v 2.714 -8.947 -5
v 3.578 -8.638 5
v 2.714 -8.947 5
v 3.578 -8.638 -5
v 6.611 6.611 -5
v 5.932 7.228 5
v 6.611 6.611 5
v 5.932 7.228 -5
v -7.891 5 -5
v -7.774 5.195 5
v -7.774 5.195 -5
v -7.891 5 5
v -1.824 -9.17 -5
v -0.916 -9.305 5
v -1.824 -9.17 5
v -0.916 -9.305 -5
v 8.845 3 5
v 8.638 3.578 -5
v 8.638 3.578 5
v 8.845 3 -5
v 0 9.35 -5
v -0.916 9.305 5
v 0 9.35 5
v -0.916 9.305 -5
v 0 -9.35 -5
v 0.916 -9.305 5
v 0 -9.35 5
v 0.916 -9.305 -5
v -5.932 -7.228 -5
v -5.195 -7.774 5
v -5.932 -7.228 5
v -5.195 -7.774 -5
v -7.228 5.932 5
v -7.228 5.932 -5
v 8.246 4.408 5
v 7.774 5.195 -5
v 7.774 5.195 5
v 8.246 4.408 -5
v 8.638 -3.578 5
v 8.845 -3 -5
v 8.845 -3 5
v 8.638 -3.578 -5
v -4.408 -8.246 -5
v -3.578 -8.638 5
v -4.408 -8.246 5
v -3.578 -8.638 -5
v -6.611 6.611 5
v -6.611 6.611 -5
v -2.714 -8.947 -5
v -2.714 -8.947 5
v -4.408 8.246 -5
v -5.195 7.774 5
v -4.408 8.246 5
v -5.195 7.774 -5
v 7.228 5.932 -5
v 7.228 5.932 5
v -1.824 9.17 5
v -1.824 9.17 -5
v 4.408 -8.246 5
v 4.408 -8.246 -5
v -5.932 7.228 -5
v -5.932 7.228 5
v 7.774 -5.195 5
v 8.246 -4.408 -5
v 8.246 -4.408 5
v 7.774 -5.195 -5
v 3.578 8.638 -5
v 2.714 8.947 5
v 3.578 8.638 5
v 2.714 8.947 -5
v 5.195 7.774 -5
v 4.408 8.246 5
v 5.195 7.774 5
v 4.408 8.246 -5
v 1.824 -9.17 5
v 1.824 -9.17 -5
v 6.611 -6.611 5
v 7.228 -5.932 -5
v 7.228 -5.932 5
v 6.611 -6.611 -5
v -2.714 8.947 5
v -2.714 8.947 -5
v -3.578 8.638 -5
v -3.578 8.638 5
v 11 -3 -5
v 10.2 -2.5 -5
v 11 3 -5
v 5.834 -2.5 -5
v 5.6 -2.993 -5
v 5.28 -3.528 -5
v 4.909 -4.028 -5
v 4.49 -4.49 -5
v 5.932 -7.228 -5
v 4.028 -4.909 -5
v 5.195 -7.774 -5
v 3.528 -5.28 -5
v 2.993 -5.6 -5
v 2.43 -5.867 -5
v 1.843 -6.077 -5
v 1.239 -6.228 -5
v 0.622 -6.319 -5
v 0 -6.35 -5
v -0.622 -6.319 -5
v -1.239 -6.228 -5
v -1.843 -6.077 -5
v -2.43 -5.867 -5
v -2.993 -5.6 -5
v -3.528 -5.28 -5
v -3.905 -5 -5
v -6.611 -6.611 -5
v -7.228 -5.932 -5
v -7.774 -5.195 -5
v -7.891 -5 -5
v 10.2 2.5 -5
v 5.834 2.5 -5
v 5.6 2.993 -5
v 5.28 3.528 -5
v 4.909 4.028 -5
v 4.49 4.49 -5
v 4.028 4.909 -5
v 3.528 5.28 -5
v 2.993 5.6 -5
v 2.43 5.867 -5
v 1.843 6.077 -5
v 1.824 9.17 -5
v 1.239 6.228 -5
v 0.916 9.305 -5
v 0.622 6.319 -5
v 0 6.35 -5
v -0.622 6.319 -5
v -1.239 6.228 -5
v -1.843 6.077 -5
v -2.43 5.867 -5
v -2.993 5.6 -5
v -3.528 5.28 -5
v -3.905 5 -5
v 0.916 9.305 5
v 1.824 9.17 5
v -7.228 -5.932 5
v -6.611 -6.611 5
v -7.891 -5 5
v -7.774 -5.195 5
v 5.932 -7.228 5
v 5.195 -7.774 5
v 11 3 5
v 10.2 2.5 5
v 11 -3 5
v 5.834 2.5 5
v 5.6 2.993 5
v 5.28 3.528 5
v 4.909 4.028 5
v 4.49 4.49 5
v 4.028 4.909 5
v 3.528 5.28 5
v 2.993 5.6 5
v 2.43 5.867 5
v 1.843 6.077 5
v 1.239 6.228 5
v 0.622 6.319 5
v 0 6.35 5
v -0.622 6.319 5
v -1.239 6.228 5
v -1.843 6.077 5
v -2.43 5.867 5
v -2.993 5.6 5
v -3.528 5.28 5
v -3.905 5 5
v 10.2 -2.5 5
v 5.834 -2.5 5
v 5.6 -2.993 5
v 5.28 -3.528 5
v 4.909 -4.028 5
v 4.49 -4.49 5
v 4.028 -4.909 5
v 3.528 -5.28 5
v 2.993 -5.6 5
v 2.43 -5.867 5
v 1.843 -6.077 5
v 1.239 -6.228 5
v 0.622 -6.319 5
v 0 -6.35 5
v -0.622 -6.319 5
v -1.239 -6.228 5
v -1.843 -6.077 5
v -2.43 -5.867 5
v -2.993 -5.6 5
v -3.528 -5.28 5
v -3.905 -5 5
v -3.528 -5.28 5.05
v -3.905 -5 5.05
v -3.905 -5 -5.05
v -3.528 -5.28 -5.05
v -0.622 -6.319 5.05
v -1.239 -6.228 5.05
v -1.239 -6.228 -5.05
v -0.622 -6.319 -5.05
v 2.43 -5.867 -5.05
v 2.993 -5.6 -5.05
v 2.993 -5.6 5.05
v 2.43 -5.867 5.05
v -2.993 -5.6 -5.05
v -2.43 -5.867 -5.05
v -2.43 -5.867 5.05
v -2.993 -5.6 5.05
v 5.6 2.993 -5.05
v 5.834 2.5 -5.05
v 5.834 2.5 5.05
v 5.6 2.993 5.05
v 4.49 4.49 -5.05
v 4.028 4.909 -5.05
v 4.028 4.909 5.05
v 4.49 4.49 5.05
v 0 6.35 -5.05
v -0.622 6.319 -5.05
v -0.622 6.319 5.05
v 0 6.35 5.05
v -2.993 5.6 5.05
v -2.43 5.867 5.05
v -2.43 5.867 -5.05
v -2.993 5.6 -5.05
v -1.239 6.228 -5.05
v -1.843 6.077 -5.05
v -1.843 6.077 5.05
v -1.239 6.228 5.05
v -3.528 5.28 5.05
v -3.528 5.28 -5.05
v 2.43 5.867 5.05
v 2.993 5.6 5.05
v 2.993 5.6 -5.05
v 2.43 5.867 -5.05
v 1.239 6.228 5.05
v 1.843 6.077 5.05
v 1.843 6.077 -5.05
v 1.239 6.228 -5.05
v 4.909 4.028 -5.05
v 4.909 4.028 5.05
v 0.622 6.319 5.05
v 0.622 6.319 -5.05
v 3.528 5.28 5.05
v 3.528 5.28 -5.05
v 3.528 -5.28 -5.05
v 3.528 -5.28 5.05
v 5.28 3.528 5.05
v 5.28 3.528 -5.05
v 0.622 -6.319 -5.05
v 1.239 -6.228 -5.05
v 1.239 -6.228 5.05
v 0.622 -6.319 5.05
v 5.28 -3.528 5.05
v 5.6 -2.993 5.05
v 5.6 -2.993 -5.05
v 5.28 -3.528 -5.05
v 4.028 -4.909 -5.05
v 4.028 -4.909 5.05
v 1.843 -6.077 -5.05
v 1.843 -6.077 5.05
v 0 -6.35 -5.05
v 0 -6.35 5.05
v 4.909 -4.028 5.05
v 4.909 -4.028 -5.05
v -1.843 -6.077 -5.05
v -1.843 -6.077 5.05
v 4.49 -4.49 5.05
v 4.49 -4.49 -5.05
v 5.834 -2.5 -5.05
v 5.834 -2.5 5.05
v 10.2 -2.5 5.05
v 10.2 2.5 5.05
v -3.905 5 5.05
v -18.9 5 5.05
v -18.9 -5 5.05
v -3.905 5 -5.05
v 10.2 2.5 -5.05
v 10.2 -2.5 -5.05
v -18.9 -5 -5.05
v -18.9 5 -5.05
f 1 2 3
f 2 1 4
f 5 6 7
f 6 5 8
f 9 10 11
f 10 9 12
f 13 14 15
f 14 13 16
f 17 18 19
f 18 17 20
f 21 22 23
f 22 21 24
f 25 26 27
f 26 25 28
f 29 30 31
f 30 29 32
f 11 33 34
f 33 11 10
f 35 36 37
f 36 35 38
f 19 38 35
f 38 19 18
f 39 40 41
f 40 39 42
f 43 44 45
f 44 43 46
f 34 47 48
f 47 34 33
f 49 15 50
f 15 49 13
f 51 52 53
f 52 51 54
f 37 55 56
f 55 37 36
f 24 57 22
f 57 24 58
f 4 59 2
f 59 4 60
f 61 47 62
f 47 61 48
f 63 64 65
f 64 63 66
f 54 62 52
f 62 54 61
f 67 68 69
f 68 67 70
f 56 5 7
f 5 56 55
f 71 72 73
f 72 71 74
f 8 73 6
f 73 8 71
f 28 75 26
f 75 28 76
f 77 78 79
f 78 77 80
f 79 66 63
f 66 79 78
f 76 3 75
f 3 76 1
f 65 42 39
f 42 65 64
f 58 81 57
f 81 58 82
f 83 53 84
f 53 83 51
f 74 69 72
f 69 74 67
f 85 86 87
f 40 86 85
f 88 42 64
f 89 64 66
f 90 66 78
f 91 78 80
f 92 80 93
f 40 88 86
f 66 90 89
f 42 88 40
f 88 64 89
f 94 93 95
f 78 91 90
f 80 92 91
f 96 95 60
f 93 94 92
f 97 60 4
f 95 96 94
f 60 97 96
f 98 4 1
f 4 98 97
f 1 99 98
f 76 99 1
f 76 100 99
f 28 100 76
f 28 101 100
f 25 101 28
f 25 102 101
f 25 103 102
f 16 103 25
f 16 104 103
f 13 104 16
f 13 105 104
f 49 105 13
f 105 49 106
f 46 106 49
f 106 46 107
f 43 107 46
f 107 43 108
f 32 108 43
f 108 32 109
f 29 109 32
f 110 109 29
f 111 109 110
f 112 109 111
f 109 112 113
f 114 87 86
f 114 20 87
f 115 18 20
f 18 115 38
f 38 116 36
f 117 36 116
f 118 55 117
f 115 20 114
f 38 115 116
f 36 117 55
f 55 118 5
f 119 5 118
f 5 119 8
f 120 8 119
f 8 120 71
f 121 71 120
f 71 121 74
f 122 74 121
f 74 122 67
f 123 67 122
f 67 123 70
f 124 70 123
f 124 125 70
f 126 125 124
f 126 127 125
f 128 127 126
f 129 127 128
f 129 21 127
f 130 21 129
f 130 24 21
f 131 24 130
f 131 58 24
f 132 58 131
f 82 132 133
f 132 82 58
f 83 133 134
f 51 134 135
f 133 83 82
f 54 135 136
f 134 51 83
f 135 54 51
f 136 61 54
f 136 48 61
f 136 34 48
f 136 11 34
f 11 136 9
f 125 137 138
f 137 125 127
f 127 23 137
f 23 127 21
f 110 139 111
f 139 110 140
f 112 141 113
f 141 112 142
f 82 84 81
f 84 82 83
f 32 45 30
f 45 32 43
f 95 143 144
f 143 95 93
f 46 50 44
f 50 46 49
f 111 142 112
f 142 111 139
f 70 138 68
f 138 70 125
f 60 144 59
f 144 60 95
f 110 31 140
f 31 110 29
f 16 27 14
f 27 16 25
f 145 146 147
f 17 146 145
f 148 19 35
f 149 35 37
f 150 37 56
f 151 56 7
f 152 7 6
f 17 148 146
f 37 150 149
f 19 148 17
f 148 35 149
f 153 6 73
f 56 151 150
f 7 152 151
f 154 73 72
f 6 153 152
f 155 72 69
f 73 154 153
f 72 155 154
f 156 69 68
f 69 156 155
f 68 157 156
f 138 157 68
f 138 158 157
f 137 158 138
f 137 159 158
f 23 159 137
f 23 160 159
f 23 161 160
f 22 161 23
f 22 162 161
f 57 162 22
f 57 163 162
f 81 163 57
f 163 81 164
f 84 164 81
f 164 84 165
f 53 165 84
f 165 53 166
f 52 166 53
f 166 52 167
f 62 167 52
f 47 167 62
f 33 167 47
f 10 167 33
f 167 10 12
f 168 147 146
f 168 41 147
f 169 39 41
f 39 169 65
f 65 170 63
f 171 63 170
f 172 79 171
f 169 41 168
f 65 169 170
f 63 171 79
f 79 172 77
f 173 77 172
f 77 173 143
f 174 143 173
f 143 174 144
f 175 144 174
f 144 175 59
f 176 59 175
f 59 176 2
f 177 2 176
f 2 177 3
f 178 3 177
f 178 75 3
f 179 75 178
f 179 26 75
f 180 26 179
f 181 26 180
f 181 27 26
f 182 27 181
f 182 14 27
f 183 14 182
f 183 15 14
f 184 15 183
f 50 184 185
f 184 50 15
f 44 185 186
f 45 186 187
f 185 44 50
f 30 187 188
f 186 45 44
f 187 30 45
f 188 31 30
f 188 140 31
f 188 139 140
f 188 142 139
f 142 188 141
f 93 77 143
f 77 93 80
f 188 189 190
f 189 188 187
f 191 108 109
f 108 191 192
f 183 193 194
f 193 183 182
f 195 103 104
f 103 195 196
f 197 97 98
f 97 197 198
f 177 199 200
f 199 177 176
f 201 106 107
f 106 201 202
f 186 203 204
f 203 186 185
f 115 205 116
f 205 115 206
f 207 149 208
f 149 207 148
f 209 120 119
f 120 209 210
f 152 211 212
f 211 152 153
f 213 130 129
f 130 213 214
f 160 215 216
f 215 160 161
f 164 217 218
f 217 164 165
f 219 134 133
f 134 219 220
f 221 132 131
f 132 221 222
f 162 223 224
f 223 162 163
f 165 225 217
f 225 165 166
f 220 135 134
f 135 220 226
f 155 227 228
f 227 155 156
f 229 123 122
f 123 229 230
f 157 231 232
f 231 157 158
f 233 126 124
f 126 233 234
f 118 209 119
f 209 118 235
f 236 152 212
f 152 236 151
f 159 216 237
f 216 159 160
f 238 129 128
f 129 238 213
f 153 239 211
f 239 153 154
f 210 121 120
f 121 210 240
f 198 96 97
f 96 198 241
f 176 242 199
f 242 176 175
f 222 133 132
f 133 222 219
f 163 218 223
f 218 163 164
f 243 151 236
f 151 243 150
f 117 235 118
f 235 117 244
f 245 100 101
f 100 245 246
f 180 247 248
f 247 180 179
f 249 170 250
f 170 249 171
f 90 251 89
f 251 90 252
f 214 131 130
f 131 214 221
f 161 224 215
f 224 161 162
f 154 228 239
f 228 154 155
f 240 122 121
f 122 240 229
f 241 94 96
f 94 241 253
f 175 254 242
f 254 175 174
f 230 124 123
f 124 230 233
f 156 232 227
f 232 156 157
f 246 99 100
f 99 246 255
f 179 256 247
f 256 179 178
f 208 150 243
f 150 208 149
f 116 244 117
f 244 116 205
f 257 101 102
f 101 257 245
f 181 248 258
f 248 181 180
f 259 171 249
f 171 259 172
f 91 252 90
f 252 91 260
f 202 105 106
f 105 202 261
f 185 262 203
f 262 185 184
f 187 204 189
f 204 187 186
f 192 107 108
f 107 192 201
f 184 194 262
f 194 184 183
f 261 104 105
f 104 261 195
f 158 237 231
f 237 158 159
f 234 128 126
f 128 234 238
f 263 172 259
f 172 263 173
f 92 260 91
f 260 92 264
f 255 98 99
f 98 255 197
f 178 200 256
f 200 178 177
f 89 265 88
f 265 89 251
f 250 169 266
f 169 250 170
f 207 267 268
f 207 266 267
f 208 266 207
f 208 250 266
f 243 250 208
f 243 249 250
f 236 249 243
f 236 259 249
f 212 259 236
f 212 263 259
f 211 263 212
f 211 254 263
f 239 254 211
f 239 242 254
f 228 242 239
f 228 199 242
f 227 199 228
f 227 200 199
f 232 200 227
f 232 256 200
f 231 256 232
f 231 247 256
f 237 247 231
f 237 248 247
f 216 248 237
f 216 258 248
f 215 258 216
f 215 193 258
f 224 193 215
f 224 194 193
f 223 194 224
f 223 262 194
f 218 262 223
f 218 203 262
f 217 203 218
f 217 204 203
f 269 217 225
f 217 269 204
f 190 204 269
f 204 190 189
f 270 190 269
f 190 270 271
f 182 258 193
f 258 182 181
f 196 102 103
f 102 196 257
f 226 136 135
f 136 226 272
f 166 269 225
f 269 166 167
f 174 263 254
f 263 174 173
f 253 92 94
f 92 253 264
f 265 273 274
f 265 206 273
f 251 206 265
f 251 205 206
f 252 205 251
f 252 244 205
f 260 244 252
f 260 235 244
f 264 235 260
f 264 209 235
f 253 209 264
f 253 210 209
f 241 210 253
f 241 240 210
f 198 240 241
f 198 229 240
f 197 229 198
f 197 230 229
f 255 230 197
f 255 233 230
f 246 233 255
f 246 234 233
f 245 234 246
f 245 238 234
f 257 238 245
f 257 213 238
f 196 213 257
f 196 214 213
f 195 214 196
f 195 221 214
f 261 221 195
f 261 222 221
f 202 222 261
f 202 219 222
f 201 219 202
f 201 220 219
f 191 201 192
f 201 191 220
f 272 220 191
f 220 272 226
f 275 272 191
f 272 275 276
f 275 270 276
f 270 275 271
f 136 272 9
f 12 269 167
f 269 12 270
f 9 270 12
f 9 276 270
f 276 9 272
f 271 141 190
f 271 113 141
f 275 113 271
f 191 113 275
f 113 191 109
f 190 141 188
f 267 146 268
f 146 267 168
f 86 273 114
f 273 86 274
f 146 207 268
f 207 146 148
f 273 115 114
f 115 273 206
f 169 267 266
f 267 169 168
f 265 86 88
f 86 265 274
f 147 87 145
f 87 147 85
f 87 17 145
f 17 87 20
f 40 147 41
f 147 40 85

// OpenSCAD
$fn = 64;

// Dimensions
rod_diameter = 12.7;       // 1/2 inch
rod_wall = 3.0;            // Wall thickness of rod ring
rod_ring_z = 10.0;          // Height of the clip
rod_ring_opening_w = 10.0; // Width of the opening on the -X side

tubing_diameter = 6.0;     // Inner diameter of tubing ring
tubing_wall = 2.0;         // Wall thickness of tubing ring
tubing_ring_z = 10.0;      // Height of the clip
tubing_ring_opening_w = 4.5;// Width of the opening on the +X side

bridge_width = 6.0;        // Width of the bridge in X
bridge_depth = 6.0;        // Depth of the bridge in Y

// Derived Dimensions
rod_outer_diameter = rod_diameter + (rod_wall * 2);
tubing_outer_diameter = tubing_diameter + (tubing_wall * 2);
tubing_ring_x_pos = 15.0;   // X position of the tubing ring
tubing_ring_y_pos = 0.0;    // Y position of the tubing ring

// Bridge Geometry
bridge_x_start = 8.0;
bridge_x_end = 12.0;
bridge_y_start = -bridge_depth / 2;
bridge_y_end = bridge_depth / 2;

module rod_ring() {
    // Outer cylinder
    cylinder(d = rod_outer_diameter, h = rod_ring_z, center = true);
    
    // Inner cylinder (cutout for rod)
    cylinder(d = rod_diameter, h = rod_ring_z + 0.1, center = true);
    
    // Opening cutout on -X side
    // We cut a rectangular box that spans the full height and depth
    translate([-rod_outer_diameter/2 - 0.1, 0, 0])
        cube([rod_outer_diameter + 0.2, 10, rod_ring_z + 0.1], center = true);
}

module tubing_ring() {
    // Outer cylinder
    cylinder(d = tubing_outer_diameter, h = tubing_ring_z, center = true);
    
    // Inner cylinder (cutout for tubing)
    cylinder(d = tubing_diameter, h = tubing_ring_z + 0.1, center = true);
    
    // Opening cutout on +X side
    translate([tubing_outer_diameter/2 + 0.1, 0, 0])
        cube([tubing_outer_diameter + 0.2, 5, tubing_ring_z + 0.1], center = true);
}

module bridge() {
    // Solid block connecting the two rings
    translate([bridge_x_start, 0, 0])
        cube([bridge_width, bridge_depth, rod_ring_z], center = true);
}

module clip() {
    union() {
        rod_ring();
        tubing_ring();
        bridge();
    }
}

// Render the clip
clip();
